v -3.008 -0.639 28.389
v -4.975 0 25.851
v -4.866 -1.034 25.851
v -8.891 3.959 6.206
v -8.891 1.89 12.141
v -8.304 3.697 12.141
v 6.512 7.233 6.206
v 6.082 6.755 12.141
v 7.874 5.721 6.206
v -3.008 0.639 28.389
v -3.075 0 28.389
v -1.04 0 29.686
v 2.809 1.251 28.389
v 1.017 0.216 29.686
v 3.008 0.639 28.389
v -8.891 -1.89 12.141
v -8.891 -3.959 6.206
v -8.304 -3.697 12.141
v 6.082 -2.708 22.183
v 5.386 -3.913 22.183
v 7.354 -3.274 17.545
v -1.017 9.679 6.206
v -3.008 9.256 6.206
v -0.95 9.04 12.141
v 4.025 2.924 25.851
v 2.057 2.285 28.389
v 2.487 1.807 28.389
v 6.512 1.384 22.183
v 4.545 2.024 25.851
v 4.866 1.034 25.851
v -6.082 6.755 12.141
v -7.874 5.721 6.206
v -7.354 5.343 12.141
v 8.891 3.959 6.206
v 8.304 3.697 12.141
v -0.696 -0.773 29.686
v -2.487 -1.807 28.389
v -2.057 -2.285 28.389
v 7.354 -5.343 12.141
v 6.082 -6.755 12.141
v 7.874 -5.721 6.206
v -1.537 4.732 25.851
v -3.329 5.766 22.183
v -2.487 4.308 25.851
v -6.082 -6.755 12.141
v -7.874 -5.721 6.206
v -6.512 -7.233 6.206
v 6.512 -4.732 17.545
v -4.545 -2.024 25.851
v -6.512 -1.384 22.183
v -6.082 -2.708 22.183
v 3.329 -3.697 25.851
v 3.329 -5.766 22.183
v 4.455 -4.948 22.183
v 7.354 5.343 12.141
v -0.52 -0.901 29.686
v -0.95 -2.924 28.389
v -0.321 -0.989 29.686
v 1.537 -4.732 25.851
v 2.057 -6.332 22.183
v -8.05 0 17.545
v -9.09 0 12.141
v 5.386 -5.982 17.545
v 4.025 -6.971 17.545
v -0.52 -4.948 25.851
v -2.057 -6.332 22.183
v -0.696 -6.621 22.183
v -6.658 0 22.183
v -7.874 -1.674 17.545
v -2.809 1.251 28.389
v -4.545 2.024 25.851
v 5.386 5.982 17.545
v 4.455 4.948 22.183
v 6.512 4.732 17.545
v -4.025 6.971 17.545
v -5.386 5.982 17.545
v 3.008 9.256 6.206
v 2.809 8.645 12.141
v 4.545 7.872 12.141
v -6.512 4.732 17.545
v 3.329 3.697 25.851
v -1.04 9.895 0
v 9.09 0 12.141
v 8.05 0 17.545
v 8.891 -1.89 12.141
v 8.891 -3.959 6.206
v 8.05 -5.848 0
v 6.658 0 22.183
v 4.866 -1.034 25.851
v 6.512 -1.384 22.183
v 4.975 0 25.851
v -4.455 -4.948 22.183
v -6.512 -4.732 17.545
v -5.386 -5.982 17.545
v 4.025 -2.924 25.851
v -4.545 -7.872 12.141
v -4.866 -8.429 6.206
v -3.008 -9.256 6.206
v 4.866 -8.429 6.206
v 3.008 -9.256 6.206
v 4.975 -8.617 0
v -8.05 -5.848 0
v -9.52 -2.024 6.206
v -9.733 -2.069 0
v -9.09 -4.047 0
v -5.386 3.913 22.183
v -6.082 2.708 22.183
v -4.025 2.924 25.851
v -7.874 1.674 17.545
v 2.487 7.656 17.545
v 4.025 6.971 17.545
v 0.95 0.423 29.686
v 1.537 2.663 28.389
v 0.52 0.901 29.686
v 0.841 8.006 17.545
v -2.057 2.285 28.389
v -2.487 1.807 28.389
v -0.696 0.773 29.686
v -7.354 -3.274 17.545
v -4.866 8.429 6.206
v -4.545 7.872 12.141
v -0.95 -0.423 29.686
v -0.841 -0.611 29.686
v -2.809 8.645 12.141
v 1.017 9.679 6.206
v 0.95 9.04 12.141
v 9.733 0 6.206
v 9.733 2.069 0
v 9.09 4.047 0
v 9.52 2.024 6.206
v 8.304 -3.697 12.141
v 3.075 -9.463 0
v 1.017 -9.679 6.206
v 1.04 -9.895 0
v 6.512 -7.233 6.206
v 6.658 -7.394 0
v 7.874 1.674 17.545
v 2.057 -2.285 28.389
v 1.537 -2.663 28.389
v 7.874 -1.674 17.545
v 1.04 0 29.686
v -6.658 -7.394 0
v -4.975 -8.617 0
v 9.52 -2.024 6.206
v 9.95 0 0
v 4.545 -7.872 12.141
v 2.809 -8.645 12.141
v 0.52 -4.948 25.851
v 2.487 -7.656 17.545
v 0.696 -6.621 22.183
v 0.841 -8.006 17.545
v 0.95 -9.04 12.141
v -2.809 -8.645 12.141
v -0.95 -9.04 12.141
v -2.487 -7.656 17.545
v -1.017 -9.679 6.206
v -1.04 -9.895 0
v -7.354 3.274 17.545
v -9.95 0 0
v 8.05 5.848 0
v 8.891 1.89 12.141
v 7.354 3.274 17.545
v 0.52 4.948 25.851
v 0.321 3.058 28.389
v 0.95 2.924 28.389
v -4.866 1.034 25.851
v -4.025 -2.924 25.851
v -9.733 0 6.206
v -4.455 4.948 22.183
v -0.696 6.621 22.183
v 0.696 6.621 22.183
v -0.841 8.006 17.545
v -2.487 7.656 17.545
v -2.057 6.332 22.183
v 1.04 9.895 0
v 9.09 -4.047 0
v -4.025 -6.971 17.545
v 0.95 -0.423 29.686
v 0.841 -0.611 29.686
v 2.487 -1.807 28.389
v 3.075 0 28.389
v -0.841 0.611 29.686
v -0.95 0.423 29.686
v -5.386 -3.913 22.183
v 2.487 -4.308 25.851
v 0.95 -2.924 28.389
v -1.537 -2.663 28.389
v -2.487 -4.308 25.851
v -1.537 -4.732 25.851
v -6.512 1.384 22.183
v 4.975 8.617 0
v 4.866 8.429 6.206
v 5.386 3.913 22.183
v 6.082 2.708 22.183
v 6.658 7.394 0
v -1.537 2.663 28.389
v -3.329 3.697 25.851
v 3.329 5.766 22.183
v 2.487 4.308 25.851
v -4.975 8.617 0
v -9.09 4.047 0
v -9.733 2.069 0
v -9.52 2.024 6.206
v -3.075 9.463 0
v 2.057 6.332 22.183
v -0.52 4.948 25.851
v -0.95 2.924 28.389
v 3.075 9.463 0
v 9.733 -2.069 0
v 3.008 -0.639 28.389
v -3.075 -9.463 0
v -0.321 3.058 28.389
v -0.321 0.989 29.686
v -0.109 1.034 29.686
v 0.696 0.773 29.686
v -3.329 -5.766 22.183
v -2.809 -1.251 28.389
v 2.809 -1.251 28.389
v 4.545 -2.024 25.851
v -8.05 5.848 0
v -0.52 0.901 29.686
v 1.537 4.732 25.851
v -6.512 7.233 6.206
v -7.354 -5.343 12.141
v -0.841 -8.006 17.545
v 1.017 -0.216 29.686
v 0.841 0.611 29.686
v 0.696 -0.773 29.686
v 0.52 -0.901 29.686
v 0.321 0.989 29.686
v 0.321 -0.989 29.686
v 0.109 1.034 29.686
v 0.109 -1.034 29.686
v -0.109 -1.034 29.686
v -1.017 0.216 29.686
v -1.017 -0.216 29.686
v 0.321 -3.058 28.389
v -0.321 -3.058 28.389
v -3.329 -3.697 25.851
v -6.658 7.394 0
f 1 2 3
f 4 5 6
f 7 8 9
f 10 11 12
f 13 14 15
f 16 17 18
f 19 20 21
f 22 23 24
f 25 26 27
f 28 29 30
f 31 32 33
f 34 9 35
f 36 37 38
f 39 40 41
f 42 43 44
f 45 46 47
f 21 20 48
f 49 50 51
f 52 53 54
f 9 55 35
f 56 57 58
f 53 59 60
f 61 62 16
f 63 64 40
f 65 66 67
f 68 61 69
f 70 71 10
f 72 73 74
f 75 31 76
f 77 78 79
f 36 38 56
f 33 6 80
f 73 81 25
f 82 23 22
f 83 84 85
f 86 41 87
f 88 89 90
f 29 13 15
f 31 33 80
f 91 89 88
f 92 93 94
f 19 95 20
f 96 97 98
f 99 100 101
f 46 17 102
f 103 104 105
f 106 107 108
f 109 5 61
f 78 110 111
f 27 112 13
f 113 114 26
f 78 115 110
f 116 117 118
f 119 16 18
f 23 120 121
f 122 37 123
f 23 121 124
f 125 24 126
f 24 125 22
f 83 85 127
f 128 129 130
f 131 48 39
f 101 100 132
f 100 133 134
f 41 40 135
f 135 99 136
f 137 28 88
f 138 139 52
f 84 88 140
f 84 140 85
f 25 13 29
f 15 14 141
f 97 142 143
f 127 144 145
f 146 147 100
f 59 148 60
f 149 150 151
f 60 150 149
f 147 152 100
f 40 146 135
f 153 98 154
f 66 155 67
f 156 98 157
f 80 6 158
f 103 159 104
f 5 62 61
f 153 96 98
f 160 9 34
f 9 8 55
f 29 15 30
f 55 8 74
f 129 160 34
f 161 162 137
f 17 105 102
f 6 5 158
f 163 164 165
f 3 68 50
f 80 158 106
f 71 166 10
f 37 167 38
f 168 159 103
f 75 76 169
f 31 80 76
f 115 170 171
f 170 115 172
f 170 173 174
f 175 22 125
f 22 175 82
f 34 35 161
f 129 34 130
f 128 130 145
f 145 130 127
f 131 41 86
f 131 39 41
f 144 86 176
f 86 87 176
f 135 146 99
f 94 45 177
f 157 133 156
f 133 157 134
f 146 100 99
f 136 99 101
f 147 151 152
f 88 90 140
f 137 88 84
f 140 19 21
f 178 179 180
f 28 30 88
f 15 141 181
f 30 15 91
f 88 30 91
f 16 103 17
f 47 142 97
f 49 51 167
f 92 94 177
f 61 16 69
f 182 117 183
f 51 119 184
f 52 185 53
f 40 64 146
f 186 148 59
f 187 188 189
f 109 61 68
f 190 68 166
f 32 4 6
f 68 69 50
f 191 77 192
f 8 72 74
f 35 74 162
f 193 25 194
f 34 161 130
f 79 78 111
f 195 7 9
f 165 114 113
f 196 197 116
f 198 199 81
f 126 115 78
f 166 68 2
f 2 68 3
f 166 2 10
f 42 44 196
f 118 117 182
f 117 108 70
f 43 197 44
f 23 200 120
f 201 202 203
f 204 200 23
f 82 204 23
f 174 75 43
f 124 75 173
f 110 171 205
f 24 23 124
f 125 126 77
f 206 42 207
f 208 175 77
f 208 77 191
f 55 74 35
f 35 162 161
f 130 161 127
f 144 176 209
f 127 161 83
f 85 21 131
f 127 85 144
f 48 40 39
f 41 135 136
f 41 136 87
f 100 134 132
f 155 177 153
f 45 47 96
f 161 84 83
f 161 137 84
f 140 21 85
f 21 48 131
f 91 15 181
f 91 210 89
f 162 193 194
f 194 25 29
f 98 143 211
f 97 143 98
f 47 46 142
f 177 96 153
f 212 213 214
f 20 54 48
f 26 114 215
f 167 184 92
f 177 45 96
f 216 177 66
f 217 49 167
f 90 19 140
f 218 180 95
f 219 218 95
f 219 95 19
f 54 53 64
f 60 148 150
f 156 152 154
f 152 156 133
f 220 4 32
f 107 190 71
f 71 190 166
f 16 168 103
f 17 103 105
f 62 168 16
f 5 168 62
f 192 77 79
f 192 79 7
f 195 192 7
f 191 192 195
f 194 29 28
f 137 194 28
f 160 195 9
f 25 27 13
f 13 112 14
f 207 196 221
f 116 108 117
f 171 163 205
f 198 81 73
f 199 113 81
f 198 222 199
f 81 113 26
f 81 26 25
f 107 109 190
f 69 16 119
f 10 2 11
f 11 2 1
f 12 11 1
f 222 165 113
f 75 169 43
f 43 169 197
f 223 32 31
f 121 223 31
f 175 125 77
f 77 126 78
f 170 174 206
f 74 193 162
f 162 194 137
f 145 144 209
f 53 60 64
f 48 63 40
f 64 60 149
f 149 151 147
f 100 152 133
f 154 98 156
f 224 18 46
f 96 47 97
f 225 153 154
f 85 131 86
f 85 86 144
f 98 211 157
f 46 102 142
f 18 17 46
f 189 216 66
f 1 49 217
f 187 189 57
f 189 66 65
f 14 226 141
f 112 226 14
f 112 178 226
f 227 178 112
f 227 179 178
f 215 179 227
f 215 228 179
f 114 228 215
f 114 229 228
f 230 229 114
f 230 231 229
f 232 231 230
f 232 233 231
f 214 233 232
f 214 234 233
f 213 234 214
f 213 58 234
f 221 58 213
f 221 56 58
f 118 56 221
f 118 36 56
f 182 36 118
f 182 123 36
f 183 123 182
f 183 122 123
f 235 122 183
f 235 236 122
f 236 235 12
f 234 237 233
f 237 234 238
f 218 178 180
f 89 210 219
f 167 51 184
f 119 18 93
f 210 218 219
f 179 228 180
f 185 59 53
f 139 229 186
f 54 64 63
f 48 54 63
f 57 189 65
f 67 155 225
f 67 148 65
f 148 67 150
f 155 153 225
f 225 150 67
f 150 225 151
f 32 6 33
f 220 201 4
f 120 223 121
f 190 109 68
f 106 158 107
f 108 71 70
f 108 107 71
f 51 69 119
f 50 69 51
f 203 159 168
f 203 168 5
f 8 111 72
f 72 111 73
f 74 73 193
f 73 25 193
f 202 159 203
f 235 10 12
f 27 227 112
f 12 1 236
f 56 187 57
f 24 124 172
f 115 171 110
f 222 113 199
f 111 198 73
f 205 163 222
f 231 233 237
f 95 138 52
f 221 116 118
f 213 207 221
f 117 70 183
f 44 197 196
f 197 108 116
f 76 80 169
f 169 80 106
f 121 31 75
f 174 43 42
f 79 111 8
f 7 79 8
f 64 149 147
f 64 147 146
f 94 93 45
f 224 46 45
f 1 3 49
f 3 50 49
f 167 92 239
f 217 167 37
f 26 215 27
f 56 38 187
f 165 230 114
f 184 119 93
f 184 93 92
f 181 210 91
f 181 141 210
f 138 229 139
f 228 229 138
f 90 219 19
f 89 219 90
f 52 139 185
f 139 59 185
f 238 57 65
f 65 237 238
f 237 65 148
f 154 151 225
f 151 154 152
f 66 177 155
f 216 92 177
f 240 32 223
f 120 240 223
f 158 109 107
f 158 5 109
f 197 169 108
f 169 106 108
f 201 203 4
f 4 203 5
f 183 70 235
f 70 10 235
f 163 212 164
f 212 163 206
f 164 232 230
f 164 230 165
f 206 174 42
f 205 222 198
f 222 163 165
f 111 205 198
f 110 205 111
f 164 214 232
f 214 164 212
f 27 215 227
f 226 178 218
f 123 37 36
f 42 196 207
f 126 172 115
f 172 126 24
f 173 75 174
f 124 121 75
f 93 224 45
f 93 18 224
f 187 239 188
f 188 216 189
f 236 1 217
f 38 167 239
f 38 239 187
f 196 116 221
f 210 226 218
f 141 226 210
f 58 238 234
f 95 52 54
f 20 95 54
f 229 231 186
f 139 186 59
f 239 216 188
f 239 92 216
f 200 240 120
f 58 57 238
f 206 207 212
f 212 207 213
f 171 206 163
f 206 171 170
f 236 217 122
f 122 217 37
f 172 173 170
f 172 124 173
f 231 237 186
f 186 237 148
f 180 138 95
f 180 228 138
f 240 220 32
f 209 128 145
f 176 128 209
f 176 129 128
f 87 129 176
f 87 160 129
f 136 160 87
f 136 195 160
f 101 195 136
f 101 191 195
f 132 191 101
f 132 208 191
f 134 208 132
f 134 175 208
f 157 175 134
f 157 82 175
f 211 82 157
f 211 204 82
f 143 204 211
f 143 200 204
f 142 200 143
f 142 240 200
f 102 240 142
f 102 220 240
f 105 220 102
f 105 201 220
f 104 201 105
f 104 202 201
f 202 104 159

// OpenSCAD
// buri.scad

engine_radius = 17.5 / 2;
engine_height = 70;

nose_assembly_thickness = 1.2;

// the engine
//cylinder(engine_height, engine_radius, engine_radius);

// the nose cone
difference() {
  scale([1, 1, 3]) {
    sphere(engine_radius + nose_assembly_thickness);
  }
  translate([0, 0, -4 / 2 * engine_radius]) {
    cube(4 * engine_radius * [1, 1, 1], true);
  }
}
